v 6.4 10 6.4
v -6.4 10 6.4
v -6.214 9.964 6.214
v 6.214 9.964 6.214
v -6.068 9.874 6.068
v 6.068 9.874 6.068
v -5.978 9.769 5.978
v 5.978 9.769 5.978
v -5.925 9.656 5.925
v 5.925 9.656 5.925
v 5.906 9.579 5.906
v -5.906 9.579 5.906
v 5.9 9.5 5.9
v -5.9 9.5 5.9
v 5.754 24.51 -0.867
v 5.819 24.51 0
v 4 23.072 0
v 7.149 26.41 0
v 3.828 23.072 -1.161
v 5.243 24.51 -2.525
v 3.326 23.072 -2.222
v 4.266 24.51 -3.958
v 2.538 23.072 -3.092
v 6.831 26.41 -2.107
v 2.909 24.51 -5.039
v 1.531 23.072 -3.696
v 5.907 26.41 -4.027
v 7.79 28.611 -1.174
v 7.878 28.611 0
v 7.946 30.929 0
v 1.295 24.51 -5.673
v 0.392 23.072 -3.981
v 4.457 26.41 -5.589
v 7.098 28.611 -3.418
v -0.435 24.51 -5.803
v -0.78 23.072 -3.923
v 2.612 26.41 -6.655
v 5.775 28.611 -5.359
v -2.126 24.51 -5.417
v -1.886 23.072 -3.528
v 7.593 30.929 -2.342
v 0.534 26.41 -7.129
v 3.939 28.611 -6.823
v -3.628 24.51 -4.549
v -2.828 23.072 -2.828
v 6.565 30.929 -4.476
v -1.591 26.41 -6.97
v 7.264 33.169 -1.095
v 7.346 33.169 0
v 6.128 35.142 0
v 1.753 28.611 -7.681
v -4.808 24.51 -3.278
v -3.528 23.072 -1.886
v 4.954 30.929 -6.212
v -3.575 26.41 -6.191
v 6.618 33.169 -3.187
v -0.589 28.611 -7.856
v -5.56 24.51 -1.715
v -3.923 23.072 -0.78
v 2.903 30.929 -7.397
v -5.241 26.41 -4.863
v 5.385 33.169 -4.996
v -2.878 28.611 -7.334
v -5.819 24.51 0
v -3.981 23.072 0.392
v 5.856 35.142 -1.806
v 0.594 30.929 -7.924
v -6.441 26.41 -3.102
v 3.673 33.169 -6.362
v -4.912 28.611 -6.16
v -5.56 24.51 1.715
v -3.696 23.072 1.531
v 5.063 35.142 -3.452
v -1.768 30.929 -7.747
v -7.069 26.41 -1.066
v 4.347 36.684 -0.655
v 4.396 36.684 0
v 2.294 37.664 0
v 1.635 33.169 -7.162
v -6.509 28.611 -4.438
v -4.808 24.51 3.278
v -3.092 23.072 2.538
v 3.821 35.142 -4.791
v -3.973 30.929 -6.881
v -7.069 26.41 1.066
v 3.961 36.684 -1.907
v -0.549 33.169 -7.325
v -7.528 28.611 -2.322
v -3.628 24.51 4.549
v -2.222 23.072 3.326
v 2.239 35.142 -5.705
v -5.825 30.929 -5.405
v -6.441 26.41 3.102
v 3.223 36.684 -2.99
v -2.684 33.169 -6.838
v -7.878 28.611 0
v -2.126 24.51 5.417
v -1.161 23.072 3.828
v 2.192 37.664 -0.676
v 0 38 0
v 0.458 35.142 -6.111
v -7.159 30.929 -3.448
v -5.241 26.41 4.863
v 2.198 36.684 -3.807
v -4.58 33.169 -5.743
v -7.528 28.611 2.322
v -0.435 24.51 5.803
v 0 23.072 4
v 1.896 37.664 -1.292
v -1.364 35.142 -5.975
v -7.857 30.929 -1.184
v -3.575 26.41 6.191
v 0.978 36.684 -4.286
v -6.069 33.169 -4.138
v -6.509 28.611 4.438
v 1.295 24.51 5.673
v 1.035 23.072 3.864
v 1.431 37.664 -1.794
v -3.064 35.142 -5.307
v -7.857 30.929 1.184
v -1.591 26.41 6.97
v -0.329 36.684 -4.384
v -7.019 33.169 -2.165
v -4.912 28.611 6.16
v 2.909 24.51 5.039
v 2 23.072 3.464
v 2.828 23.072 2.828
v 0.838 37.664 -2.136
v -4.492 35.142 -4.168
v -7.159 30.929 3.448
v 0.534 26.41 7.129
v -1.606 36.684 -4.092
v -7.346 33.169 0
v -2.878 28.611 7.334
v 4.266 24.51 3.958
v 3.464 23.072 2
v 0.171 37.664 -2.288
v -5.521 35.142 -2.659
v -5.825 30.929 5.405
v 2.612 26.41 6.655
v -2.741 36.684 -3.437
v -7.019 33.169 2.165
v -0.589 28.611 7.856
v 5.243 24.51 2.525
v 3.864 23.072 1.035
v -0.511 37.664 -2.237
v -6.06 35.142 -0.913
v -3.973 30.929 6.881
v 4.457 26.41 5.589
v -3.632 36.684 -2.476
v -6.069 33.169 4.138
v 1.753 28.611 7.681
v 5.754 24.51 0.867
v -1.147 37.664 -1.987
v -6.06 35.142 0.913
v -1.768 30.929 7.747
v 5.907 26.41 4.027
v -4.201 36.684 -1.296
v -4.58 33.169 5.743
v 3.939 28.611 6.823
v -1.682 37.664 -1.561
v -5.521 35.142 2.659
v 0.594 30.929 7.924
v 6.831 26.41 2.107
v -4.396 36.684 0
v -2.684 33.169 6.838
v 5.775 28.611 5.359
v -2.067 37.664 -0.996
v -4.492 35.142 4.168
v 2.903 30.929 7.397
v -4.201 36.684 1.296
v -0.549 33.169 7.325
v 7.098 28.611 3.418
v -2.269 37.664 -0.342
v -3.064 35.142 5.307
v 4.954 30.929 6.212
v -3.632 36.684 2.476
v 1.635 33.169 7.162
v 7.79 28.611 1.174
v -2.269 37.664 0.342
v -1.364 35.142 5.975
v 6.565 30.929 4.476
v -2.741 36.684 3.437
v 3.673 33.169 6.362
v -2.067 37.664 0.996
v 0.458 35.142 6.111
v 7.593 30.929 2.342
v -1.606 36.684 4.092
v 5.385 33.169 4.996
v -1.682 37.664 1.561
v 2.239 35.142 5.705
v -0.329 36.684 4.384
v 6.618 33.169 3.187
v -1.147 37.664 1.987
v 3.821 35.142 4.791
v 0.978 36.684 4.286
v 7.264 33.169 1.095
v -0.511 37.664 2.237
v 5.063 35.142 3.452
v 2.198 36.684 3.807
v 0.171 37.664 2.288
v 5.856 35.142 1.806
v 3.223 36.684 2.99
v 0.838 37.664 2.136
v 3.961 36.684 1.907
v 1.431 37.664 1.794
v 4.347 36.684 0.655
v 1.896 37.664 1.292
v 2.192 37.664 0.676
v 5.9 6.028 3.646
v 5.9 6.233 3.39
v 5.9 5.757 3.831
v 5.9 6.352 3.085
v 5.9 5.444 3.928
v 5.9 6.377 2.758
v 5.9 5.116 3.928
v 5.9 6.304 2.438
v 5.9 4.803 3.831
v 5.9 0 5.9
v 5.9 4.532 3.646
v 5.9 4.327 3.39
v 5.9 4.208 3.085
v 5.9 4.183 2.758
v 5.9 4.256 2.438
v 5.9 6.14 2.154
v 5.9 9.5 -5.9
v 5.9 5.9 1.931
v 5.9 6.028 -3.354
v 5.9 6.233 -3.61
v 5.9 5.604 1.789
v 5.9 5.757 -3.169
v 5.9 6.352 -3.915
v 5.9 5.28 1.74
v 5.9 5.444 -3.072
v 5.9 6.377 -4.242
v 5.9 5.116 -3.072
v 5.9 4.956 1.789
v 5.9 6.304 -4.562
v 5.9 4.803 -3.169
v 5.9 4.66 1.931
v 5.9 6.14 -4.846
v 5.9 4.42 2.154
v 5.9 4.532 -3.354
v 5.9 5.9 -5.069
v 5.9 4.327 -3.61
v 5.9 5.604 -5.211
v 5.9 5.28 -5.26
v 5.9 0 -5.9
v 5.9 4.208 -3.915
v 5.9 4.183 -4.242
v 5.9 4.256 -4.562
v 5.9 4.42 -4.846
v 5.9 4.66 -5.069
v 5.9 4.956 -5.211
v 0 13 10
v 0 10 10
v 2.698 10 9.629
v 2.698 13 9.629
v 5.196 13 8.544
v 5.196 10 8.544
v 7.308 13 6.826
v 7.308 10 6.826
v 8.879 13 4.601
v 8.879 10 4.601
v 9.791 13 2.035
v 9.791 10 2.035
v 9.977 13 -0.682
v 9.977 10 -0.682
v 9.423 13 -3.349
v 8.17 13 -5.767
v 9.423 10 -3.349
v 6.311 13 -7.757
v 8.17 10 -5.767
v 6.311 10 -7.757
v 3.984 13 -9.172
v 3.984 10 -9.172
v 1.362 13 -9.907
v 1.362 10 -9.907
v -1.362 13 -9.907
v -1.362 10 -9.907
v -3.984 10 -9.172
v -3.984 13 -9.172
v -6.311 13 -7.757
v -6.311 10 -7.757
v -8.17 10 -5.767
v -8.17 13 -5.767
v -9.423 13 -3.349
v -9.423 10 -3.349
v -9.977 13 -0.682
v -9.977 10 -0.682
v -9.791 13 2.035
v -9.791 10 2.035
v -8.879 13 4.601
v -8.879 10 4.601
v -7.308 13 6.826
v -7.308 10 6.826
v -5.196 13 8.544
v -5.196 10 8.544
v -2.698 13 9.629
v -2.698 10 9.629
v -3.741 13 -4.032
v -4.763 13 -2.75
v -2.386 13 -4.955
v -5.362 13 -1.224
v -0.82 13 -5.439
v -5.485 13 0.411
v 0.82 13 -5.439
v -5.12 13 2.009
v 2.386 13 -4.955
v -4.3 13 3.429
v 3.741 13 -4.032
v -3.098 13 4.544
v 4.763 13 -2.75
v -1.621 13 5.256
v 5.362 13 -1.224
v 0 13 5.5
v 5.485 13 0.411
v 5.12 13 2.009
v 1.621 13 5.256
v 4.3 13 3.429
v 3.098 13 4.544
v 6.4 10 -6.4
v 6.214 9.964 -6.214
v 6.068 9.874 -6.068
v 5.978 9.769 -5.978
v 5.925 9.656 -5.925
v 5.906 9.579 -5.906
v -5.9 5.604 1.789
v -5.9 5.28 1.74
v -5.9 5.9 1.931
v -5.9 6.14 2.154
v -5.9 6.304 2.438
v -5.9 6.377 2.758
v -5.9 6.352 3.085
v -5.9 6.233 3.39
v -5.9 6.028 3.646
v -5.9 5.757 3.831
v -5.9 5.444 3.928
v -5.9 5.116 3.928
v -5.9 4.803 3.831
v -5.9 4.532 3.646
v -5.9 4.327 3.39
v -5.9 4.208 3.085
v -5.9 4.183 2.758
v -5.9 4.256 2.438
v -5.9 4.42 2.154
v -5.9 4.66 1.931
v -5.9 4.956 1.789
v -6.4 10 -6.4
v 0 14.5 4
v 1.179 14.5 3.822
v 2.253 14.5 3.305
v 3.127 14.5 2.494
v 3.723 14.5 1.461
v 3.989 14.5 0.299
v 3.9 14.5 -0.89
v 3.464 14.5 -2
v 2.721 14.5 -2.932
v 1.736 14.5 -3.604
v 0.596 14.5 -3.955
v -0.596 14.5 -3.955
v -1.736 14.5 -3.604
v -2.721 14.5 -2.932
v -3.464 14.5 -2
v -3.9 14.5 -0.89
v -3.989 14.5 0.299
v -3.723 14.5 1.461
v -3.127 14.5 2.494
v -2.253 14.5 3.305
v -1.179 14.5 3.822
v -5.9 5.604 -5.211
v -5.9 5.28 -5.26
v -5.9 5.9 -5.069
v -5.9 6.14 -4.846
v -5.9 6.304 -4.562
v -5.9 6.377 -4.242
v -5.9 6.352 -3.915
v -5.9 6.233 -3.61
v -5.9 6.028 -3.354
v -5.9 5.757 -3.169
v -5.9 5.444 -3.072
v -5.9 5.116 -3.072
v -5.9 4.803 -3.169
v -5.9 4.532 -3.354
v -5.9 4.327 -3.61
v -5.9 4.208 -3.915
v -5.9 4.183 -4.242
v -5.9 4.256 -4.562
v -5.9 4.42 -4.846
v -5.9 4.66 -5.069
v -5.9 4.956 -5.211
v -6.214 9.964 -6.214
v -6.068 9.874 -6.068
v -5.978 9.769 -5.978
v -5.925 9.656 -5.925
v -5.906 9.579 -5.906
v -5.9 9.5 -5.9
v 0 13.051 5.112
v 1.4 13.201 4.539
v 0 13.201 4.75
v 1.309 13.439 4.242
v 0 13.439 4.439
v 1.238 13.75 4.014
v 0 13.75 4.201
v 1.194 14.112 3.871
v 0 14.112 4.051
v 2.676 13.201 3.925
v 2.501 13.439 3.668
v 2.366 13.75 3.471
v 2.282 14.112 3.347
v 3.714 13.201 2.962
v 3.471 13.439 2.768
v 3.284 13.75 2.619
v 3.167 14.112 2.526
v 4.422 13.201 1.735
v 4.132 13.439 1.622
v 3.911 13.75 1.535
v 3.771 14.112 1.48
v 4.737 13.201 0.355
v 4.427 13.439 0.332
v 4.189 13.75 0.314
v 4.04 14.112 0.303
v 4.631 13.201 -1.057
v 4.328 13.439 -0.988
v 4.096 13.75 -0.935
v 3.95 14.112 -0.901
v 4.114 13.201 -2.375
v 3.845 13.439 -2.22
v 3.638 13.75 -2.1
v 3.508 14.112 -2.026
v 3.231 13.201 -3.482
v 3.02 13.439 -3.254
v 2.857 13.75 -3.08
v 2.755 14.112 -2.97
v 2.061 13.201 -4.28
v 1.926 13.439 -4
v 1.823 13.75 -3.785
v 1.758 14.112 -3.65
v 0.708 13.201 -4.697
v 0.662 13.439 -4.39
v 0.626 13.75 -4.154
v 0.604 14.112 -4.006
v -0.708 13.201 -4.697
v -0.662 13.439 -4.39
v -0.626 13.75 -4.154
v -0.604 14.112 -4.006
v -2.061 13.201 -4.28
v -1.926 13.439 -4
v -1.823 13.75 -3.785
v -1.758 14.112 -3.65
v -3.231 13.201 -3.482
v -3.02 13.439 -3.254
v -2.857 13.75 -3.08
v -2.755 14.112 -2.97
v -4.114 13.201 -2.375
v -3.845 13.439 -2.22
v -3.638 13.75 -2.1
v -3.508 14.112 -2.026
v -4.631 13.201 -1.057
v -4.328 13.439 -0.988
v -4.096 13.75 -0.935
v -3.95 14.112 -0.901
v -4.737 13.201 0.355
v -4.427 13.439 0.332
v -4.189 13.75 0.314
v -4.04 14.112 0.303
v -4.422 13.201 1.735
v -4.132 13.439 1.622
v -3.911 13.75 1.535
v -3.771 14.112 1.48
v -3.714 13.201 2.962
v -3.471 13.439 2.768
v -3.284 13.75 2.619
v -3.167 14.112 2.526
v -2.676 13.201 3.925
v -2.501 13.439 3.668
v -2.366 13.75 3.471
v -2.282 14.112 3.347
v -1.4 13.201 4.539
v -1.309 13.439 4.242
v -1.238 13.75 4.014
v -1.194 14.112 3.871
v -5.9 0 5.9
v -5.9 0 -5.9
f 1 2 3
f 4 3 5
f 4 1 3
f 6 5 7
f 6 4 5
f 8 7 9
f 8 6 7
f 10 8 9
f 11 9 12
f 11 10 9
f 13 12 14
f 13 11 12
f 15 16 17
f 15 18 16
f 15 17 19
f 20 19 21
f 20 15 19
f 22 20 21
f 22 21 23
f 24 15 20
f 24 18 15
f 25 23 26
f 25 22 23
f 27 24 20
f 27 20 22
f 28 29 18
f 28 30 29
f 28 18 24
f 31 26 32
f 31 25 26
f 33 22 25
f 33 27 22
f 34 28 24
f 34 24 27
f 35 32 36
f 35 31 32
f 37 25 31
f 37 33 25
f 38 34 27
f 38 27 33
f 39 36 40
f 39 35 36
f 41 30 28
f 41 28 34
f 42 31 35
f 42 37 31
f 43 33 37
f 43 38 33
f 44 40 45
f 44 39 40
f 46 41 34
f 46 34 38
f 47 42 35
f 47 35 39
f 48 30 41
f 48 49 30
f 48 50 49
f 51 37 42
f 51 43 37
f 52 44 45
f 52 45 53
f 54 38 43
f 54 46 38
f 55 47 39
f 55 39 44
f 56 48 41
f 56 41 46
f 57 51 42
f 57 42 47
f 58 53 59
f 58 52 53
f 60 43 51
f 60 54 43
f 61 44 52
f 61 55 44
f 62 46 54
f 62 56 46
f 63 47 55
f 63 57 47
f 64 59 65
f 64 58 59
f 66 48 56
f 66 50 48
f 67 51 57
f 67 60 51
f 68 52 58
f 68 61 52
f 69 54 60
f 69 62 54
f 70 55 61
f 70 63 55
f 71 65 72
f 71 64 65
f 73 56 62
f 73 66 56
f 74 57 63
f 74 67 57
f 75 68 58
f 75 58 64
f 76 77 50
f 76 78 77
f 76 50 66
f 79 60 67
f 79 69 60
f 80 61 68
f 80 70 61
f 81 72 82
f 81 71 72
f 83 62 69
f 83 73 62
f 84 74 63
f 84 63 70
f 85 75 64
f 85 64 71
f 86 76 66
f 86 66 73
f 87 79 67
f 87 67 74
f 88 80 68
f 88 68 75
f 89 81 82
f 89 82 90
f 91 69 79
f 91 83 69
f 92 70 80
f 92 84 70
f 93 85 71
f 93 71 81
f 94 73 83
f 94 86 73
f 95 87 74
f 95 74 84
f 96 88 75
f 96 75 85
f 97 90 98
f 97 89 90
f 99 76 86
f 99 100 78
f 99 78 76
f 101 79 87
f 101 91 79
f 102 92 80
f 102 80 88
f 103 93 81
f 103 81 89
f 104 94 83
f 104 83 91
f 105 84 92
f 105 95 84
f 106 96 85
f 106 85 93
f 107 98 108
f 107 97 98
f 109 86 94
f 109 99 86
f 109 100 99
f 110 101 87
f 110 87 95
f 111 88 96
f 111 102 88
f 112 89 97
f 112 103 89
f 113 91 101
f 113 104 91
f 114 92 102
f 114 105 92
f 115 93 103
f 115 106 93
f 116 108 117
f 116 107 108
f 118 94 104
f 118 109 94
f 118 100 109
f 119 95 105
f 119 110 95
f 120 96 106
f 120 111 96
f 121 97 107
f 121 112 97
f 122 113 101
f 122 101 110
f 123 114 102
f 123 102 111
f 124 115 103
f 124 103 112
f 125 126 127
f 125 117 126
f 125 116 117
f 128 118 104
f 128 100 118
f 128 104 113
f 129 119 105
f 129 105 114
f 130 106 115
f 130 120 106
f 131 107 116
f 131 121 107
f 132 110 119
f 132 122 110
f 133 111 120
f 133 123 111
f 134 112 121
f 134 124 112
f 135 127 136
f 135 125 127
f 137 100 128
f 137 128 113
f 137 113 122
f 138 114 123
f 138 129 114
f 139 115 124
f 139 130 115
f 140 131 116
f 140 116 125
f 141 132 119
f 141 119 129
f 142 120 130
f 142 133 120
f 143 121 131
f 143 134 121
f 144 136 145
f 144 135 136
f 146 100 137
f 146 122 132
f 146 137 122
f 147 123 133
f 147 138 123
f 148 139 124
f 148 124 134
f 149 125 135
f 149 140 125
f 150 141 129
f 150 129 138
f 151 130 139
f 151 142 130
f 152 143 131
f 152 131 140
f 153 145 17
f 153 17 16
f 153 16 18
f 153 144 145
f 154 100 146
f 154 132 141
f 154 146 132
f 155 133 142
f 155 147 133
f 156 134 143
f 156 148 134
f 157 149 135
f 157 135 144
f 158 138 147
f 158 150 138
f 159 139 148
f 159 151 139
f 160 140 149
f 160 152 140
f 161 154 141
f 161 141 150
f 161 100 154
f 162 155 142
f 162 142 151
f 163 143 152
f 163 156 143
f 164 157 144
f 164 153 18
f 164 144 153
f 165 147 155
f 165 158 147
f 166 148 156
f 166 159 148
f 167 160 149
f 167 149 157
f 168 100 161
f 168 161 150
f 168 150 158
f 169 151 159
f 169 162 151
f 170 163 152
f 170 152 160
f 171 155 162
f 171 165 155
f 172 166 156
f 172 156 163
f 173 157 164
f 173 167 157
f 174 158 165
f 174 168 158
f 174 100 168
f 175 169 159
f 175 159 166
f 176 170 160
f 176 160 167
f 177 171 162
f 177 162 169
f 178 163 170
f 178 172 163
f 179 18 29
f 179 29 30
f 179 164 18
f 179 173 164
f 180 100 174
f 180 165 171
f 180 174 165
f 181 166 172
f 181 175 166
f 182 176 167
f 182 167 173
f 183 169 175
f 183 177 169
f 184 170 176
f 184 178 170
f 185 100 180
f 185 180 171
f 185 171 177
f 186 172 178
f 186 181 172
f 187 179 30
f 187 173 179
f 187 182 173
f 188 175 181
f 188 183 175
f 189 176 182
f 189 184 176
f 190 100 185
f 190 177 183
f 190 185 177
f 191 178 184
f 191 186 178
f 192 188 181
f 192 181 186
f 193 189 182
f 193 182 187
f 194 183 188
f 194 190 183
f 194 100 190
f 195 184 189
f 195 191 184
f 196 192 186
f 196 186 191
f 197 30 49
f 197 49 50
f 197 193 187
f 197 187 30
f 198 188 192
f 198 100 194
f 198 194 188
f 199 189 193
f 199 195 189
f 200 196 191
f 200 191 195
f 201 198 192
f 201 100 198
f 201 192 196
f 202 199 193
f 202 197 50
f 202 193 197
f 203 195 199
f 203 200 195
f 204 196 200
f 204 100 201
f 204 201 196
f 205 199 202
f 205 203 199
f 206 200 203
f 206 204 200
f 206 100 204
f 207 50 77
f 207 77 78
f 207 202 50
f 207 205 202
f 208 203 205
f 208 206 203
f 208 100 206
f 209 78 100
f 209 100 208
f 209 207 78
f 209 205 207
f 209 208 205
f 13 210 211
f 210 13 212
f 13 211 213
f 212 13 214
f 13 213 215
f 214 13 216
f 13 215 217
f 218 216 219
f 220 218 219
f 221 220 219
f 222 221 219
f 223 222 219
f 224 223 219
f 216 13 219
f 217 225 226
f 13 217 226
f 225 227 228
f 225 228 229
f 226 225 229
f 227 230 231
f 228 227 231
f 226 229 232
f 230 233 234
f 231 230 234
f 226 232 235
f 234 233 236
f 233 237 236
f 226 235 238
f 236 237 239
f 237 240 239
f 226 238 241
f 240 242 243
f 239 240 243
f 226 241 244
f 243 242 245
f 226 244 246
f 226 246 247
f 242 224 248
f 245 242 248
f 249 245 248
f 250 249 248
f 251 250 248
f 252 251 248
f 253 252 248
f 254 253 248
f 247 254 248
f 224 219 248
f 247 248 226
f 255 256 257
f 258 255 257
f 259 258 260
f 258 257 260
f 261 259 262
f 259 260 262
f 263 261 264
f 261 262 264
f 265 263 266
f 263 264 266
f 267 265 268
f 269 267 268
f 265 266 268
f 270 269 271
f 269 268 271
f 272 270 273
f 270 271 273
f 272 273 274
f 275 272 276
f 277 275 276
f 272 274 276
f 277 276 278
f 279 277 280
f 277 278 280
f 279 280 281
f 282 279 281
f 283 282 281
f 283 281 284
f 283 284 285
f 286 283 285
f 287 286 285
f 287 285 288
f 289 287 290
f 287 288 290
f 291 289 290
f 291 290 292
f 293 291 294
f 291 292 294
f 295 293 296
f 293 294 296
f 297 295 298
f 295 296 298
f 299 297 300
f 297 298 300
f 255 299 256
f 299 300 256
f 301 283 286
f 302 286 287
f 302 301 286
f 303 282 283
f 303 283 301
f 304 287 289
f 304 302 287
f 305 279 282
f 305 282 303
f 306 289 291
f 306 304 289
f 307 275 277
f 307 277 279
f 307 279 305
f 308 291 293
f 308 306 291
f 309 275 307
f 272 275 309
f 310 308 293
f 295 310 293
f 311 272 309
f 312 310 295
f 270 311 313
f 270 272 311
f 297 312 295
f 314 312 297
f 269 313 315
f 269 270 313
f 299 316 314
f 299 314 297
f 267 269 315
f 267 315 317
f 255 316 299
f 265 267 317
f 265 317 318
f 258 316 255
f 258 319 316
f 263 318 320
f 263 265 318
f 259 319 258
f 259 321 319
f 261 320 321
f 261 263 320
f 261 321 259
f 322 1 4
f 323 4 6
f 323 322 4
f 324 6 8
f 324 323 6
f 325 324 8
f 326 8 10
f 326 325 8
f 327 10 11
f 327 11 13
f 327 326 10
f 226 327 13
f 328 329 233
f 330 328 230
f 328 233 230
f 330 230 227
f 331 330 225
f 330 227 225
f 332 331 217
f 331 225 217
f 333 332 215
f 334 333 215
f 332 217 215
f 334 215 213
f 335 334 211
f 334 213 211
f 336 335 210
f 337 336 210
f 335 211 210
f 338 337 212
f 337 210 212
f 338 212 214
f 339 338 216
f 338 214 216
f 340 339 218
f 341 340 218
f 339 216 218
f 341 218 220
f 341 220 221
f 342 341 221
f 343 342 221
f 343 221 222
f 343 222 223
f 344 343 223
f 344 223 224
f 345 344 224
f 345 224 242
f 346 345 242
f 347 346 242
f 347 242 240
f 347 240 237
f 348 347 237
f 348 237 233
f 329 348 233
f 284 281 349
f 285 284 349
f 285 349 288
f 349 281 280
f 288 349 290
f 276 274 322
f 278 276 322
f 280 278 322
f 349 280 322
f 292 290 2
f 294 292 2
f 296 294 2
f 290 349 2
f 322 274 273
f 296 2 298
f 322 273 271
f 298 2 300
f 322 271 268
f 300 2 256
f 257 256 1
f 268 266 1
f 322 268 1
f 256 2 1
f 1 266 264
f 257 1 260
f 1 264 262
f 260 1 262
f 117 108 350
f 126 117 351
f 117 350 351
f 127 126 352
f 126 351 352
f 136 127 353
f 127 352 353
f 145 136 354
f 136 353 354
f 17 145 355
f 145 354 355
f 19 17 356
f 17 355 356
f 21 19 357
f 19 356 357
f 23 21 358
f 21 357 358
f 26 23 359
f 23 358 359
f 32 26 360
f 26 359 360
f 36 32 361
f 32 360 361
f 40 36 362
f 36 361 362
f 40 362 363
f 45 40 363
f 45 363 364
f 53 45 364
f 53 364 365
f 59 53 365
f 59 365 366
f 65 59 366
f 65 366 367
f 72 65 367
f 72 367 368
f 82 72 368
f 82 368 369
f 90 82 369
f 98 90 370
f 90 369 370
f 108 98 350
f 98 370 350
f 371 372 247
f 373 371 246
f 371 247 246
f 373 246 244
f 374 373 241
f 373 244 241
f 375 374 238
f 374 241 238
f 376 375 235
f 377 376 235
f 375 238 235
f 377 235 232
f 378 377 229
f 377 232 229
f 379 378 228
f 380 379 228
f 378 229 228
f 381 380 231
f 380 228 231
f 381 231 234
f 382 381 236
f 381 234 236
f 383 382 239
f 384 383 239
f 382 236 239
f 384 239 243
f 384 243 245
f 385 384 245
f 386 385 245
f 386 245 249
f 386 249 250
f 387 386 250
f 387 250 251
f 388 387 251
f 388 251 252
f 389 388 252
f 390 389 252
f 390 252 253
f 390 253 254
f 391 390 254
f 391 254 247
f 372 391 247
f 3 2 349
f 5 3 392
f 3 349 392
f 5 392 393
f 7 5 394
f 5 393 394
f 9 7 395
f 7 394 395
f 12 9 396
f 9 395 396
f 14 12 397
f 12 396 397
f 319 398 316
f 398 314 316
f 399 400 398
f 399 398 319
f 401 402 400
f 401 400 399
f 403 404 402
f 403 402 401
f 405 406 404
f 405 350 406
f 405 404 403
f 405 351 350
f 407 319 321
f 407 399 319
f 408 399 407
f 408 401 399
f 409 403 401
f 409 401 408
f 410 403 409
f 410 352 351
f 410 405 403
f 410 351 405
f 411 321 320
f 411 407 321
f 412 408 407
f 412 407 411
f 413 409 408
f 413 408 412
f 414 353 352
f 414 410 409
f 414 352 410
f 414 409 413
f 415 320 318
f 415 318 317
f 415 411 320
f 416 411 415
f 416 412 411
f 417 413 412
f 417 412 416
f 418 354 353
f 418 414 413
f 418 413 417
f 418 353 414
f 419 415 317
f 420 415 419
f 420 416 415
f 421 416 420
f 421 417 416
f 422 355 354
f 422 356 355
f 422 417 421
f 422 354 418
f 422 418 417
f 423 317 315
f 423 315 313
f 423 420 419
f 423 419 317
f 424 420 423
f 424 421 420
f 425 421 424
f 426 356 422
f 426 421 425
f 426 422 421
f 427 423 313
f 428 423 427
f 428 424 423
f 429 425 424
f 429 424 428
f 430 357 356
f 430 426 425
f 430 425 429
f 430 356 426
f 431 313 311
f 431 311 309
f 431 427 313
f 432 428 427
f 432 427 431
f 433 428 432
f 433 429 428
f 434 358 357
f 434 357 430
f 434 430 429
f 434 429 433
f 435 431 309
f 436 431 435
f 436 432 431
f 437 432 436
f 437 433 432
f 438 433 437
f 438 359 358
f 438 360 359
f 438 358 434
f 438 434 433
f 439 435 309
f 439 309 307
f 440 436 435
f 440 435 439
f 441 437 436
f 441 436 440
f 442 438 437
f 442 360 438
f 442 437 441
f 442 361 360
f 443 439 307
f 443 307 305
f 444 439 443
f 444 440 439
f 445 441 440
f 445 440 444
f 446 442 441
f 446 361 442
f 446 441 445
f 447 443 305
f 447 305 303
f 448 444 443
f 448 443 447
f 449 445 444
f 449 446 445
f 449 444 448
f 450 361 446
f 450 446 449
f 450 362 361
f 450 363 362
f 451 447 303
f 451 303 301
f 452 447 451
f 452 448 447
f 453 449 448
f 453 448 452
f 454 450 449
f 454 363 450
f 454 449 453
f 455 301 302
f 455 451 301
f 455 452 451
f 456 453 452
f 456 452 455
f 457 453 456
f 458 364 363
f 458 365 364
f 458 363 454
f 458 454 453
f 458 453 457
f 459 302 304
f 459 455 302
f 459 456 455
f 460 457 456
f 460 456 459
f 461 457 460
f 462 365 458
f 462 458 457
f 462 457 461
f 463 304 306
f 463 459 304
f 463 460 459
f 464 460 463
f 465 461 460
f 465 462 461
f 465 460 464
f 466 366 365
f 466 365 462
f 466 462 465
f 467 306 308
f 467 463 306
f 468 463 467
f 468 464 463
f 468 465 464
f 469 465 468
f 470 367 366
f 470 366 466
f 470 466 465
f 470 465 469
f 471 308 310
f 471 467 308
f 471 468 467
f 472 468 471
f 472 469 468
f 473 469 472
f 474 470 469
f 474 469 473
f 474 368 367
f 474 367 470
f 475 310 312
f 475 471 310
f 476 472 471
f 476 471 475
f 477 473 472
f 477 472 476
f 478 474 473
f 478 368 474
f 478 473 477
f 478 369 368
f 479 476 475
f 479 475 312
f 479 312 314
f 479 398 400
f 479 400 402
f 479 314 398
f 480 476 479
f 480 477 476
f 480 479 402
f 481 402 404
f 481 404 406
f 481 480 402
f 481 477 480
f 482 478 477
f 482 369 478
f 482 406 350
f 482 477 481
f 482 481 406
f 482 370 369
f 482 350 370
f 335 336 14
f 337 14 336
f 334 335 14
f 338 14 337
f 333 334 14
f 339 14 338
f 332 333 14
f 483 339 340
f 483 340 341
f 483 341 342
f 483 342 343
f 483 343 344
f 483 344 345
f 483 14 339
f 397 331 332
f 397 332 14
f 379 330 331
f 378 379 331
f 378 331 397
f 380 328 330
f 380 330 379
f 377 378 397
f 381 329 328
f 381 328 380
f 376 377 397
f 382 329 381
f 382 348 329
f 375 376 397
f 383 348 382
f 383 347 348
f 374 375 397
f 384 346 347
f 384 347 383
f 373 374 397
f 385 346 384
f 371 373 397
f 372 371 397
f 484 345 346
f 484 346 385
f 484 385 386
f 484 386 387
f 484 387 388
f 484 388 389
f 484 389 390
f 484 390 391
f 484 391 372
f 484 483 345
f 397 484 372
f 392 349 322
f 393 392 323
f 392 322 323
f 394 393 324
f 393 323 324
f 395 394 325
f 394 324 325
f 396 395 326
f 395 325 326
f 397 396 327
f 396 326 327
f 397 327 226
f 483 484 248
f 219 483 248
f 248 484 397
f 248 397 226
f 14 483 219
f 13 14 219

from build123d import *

# Parameters (mm, degrees)
SKETCH1_W           = 11.8
SKETCH1_H           = 11.8
BOSS_EXTRUDE1_DEPTH = 10
SKETCH2_R           = 10
BOSS_EXTRUDE2_DEPTH = 3
SKETCH3_R           = 4
BOSS_EXTRUDE3_DEPTH = 15
FILLET1_R           = 0.5
FILLET2_R           = 1.5
CUT_EXTRUDE1_REACH  = 44.389
SKETCH6_R           = 1.1


with BuildPart() as part:
    # Sketch1 → Boss-Extrude1 (new body)
    with BuildSketch(Plane(origin=(0, 0, 0), x_dir=(1, 0, 0), z_dir=(0, 1, 0))):
        Rectangle(SKETCH1_W, SKETCH1_H)
    extrude(amount=BOSS_EXTRUDE1_DEPTH)

    # Sketch2 → Boss-Extrude2 (add)
    with BuildSketch(Plane(origin=(0, 10, 0), x_dir=(1, 0, 0), z_dir=(0, 1, 0))):
        with Locations(Location((0, 0, 0), (0, 0, 270))):
            Circle(SKETCH2_R)
    extrude(amount=BOSS_EXTRUDE2_DEPTH)

    # Sketch3 → Boss-Extrude3 (add)
    with BuildSketch(Plane(origin=(0, 13, 0), x_dir=(1, 0, 0), z_dir=(0, 1, 0))):
        with Locations(Location((0, 0, 0), (0, 0, 270))):
            Circle(SKETCH3_R)
    extrude(amount=BOSS_EXTRUDE3_DEPTH)

    # Sketch4 → Revolve1 (revolve)
    with BuildSketch(Plane.XY):
        with BuildLine():
            Line((0, 38), (0, 22))
            ThreePointArc((0, 22), (8, 30), (0, 38))
        make_face()
    revolve(axis=Axis((0, 0, 0), (0, 1, 0)))

    # Fillet1
    fillet1_edges = [part.edges().sort_by_distance(p)[0] for p in [
        (-5.9, 10, 0),
        (0, 10, 5.9),
        (5.9, 10, 0),
        (0, 10, -5.9),
    ]]
    fillet(fillet1_edges, radius=FILLET1_R)

    # Fillet2
    fillet2_edges = [part.edges().sort_by_distance(p)[0] for p in [
        (0, 13, -4),
    ]]
    fillet(fillet2_edges, radius=FILLET2_R)

    # Sketch6 → Cut-Extrude1 (cut, up to next)
    with BuildSketch(Plane(origin=(5.9, 0, 0), x_dir=(0, 0, -1), z_dir=(1, 0, 0)), mode=Mode.PRIVATE) as cut_extrude1_sk1:
        with Locations((-2.84, 5.28)):
            Circle(SKETCH6_R)
    cut_extrude1_tool1 = extrude(cut_extrude1_sk1.sketch, amount=-CUT_EXTRUDE1_REACH, mode=Mode.PRIVATE) & part.part
    # Sketch6 → Cut-Extrude1 (cut, up to next)
    with BuildSketch(Plane(origin=(5.9, 0, 0), x_dir=(0, 0, -1), z_dir=(1, 0, 0)), mode=Mode.PRIVATE) as cut_extrude1_sk2:
        with Locations((4.16, 5.28)):
            Circle(SKETCH6_R)
    cut_extrude1_tool2 = extrude(cut_extrude1_sk2.sketch, amount=-CUT_EXTRUDE1_REACH, mode=Mode.PRIVATE) & part.part
    add(cut_extrude1_tool1.solids().sort_by_distance((5.9, 5.28, 2.84))[0], mode=Mode.SUBTRACT)
    add(cut_extrude1_tool2.solids().sort_by_distance((5.9, 5.28, -4.16))[0], mode=Mode.SUBTRACT)


solid = part.part
